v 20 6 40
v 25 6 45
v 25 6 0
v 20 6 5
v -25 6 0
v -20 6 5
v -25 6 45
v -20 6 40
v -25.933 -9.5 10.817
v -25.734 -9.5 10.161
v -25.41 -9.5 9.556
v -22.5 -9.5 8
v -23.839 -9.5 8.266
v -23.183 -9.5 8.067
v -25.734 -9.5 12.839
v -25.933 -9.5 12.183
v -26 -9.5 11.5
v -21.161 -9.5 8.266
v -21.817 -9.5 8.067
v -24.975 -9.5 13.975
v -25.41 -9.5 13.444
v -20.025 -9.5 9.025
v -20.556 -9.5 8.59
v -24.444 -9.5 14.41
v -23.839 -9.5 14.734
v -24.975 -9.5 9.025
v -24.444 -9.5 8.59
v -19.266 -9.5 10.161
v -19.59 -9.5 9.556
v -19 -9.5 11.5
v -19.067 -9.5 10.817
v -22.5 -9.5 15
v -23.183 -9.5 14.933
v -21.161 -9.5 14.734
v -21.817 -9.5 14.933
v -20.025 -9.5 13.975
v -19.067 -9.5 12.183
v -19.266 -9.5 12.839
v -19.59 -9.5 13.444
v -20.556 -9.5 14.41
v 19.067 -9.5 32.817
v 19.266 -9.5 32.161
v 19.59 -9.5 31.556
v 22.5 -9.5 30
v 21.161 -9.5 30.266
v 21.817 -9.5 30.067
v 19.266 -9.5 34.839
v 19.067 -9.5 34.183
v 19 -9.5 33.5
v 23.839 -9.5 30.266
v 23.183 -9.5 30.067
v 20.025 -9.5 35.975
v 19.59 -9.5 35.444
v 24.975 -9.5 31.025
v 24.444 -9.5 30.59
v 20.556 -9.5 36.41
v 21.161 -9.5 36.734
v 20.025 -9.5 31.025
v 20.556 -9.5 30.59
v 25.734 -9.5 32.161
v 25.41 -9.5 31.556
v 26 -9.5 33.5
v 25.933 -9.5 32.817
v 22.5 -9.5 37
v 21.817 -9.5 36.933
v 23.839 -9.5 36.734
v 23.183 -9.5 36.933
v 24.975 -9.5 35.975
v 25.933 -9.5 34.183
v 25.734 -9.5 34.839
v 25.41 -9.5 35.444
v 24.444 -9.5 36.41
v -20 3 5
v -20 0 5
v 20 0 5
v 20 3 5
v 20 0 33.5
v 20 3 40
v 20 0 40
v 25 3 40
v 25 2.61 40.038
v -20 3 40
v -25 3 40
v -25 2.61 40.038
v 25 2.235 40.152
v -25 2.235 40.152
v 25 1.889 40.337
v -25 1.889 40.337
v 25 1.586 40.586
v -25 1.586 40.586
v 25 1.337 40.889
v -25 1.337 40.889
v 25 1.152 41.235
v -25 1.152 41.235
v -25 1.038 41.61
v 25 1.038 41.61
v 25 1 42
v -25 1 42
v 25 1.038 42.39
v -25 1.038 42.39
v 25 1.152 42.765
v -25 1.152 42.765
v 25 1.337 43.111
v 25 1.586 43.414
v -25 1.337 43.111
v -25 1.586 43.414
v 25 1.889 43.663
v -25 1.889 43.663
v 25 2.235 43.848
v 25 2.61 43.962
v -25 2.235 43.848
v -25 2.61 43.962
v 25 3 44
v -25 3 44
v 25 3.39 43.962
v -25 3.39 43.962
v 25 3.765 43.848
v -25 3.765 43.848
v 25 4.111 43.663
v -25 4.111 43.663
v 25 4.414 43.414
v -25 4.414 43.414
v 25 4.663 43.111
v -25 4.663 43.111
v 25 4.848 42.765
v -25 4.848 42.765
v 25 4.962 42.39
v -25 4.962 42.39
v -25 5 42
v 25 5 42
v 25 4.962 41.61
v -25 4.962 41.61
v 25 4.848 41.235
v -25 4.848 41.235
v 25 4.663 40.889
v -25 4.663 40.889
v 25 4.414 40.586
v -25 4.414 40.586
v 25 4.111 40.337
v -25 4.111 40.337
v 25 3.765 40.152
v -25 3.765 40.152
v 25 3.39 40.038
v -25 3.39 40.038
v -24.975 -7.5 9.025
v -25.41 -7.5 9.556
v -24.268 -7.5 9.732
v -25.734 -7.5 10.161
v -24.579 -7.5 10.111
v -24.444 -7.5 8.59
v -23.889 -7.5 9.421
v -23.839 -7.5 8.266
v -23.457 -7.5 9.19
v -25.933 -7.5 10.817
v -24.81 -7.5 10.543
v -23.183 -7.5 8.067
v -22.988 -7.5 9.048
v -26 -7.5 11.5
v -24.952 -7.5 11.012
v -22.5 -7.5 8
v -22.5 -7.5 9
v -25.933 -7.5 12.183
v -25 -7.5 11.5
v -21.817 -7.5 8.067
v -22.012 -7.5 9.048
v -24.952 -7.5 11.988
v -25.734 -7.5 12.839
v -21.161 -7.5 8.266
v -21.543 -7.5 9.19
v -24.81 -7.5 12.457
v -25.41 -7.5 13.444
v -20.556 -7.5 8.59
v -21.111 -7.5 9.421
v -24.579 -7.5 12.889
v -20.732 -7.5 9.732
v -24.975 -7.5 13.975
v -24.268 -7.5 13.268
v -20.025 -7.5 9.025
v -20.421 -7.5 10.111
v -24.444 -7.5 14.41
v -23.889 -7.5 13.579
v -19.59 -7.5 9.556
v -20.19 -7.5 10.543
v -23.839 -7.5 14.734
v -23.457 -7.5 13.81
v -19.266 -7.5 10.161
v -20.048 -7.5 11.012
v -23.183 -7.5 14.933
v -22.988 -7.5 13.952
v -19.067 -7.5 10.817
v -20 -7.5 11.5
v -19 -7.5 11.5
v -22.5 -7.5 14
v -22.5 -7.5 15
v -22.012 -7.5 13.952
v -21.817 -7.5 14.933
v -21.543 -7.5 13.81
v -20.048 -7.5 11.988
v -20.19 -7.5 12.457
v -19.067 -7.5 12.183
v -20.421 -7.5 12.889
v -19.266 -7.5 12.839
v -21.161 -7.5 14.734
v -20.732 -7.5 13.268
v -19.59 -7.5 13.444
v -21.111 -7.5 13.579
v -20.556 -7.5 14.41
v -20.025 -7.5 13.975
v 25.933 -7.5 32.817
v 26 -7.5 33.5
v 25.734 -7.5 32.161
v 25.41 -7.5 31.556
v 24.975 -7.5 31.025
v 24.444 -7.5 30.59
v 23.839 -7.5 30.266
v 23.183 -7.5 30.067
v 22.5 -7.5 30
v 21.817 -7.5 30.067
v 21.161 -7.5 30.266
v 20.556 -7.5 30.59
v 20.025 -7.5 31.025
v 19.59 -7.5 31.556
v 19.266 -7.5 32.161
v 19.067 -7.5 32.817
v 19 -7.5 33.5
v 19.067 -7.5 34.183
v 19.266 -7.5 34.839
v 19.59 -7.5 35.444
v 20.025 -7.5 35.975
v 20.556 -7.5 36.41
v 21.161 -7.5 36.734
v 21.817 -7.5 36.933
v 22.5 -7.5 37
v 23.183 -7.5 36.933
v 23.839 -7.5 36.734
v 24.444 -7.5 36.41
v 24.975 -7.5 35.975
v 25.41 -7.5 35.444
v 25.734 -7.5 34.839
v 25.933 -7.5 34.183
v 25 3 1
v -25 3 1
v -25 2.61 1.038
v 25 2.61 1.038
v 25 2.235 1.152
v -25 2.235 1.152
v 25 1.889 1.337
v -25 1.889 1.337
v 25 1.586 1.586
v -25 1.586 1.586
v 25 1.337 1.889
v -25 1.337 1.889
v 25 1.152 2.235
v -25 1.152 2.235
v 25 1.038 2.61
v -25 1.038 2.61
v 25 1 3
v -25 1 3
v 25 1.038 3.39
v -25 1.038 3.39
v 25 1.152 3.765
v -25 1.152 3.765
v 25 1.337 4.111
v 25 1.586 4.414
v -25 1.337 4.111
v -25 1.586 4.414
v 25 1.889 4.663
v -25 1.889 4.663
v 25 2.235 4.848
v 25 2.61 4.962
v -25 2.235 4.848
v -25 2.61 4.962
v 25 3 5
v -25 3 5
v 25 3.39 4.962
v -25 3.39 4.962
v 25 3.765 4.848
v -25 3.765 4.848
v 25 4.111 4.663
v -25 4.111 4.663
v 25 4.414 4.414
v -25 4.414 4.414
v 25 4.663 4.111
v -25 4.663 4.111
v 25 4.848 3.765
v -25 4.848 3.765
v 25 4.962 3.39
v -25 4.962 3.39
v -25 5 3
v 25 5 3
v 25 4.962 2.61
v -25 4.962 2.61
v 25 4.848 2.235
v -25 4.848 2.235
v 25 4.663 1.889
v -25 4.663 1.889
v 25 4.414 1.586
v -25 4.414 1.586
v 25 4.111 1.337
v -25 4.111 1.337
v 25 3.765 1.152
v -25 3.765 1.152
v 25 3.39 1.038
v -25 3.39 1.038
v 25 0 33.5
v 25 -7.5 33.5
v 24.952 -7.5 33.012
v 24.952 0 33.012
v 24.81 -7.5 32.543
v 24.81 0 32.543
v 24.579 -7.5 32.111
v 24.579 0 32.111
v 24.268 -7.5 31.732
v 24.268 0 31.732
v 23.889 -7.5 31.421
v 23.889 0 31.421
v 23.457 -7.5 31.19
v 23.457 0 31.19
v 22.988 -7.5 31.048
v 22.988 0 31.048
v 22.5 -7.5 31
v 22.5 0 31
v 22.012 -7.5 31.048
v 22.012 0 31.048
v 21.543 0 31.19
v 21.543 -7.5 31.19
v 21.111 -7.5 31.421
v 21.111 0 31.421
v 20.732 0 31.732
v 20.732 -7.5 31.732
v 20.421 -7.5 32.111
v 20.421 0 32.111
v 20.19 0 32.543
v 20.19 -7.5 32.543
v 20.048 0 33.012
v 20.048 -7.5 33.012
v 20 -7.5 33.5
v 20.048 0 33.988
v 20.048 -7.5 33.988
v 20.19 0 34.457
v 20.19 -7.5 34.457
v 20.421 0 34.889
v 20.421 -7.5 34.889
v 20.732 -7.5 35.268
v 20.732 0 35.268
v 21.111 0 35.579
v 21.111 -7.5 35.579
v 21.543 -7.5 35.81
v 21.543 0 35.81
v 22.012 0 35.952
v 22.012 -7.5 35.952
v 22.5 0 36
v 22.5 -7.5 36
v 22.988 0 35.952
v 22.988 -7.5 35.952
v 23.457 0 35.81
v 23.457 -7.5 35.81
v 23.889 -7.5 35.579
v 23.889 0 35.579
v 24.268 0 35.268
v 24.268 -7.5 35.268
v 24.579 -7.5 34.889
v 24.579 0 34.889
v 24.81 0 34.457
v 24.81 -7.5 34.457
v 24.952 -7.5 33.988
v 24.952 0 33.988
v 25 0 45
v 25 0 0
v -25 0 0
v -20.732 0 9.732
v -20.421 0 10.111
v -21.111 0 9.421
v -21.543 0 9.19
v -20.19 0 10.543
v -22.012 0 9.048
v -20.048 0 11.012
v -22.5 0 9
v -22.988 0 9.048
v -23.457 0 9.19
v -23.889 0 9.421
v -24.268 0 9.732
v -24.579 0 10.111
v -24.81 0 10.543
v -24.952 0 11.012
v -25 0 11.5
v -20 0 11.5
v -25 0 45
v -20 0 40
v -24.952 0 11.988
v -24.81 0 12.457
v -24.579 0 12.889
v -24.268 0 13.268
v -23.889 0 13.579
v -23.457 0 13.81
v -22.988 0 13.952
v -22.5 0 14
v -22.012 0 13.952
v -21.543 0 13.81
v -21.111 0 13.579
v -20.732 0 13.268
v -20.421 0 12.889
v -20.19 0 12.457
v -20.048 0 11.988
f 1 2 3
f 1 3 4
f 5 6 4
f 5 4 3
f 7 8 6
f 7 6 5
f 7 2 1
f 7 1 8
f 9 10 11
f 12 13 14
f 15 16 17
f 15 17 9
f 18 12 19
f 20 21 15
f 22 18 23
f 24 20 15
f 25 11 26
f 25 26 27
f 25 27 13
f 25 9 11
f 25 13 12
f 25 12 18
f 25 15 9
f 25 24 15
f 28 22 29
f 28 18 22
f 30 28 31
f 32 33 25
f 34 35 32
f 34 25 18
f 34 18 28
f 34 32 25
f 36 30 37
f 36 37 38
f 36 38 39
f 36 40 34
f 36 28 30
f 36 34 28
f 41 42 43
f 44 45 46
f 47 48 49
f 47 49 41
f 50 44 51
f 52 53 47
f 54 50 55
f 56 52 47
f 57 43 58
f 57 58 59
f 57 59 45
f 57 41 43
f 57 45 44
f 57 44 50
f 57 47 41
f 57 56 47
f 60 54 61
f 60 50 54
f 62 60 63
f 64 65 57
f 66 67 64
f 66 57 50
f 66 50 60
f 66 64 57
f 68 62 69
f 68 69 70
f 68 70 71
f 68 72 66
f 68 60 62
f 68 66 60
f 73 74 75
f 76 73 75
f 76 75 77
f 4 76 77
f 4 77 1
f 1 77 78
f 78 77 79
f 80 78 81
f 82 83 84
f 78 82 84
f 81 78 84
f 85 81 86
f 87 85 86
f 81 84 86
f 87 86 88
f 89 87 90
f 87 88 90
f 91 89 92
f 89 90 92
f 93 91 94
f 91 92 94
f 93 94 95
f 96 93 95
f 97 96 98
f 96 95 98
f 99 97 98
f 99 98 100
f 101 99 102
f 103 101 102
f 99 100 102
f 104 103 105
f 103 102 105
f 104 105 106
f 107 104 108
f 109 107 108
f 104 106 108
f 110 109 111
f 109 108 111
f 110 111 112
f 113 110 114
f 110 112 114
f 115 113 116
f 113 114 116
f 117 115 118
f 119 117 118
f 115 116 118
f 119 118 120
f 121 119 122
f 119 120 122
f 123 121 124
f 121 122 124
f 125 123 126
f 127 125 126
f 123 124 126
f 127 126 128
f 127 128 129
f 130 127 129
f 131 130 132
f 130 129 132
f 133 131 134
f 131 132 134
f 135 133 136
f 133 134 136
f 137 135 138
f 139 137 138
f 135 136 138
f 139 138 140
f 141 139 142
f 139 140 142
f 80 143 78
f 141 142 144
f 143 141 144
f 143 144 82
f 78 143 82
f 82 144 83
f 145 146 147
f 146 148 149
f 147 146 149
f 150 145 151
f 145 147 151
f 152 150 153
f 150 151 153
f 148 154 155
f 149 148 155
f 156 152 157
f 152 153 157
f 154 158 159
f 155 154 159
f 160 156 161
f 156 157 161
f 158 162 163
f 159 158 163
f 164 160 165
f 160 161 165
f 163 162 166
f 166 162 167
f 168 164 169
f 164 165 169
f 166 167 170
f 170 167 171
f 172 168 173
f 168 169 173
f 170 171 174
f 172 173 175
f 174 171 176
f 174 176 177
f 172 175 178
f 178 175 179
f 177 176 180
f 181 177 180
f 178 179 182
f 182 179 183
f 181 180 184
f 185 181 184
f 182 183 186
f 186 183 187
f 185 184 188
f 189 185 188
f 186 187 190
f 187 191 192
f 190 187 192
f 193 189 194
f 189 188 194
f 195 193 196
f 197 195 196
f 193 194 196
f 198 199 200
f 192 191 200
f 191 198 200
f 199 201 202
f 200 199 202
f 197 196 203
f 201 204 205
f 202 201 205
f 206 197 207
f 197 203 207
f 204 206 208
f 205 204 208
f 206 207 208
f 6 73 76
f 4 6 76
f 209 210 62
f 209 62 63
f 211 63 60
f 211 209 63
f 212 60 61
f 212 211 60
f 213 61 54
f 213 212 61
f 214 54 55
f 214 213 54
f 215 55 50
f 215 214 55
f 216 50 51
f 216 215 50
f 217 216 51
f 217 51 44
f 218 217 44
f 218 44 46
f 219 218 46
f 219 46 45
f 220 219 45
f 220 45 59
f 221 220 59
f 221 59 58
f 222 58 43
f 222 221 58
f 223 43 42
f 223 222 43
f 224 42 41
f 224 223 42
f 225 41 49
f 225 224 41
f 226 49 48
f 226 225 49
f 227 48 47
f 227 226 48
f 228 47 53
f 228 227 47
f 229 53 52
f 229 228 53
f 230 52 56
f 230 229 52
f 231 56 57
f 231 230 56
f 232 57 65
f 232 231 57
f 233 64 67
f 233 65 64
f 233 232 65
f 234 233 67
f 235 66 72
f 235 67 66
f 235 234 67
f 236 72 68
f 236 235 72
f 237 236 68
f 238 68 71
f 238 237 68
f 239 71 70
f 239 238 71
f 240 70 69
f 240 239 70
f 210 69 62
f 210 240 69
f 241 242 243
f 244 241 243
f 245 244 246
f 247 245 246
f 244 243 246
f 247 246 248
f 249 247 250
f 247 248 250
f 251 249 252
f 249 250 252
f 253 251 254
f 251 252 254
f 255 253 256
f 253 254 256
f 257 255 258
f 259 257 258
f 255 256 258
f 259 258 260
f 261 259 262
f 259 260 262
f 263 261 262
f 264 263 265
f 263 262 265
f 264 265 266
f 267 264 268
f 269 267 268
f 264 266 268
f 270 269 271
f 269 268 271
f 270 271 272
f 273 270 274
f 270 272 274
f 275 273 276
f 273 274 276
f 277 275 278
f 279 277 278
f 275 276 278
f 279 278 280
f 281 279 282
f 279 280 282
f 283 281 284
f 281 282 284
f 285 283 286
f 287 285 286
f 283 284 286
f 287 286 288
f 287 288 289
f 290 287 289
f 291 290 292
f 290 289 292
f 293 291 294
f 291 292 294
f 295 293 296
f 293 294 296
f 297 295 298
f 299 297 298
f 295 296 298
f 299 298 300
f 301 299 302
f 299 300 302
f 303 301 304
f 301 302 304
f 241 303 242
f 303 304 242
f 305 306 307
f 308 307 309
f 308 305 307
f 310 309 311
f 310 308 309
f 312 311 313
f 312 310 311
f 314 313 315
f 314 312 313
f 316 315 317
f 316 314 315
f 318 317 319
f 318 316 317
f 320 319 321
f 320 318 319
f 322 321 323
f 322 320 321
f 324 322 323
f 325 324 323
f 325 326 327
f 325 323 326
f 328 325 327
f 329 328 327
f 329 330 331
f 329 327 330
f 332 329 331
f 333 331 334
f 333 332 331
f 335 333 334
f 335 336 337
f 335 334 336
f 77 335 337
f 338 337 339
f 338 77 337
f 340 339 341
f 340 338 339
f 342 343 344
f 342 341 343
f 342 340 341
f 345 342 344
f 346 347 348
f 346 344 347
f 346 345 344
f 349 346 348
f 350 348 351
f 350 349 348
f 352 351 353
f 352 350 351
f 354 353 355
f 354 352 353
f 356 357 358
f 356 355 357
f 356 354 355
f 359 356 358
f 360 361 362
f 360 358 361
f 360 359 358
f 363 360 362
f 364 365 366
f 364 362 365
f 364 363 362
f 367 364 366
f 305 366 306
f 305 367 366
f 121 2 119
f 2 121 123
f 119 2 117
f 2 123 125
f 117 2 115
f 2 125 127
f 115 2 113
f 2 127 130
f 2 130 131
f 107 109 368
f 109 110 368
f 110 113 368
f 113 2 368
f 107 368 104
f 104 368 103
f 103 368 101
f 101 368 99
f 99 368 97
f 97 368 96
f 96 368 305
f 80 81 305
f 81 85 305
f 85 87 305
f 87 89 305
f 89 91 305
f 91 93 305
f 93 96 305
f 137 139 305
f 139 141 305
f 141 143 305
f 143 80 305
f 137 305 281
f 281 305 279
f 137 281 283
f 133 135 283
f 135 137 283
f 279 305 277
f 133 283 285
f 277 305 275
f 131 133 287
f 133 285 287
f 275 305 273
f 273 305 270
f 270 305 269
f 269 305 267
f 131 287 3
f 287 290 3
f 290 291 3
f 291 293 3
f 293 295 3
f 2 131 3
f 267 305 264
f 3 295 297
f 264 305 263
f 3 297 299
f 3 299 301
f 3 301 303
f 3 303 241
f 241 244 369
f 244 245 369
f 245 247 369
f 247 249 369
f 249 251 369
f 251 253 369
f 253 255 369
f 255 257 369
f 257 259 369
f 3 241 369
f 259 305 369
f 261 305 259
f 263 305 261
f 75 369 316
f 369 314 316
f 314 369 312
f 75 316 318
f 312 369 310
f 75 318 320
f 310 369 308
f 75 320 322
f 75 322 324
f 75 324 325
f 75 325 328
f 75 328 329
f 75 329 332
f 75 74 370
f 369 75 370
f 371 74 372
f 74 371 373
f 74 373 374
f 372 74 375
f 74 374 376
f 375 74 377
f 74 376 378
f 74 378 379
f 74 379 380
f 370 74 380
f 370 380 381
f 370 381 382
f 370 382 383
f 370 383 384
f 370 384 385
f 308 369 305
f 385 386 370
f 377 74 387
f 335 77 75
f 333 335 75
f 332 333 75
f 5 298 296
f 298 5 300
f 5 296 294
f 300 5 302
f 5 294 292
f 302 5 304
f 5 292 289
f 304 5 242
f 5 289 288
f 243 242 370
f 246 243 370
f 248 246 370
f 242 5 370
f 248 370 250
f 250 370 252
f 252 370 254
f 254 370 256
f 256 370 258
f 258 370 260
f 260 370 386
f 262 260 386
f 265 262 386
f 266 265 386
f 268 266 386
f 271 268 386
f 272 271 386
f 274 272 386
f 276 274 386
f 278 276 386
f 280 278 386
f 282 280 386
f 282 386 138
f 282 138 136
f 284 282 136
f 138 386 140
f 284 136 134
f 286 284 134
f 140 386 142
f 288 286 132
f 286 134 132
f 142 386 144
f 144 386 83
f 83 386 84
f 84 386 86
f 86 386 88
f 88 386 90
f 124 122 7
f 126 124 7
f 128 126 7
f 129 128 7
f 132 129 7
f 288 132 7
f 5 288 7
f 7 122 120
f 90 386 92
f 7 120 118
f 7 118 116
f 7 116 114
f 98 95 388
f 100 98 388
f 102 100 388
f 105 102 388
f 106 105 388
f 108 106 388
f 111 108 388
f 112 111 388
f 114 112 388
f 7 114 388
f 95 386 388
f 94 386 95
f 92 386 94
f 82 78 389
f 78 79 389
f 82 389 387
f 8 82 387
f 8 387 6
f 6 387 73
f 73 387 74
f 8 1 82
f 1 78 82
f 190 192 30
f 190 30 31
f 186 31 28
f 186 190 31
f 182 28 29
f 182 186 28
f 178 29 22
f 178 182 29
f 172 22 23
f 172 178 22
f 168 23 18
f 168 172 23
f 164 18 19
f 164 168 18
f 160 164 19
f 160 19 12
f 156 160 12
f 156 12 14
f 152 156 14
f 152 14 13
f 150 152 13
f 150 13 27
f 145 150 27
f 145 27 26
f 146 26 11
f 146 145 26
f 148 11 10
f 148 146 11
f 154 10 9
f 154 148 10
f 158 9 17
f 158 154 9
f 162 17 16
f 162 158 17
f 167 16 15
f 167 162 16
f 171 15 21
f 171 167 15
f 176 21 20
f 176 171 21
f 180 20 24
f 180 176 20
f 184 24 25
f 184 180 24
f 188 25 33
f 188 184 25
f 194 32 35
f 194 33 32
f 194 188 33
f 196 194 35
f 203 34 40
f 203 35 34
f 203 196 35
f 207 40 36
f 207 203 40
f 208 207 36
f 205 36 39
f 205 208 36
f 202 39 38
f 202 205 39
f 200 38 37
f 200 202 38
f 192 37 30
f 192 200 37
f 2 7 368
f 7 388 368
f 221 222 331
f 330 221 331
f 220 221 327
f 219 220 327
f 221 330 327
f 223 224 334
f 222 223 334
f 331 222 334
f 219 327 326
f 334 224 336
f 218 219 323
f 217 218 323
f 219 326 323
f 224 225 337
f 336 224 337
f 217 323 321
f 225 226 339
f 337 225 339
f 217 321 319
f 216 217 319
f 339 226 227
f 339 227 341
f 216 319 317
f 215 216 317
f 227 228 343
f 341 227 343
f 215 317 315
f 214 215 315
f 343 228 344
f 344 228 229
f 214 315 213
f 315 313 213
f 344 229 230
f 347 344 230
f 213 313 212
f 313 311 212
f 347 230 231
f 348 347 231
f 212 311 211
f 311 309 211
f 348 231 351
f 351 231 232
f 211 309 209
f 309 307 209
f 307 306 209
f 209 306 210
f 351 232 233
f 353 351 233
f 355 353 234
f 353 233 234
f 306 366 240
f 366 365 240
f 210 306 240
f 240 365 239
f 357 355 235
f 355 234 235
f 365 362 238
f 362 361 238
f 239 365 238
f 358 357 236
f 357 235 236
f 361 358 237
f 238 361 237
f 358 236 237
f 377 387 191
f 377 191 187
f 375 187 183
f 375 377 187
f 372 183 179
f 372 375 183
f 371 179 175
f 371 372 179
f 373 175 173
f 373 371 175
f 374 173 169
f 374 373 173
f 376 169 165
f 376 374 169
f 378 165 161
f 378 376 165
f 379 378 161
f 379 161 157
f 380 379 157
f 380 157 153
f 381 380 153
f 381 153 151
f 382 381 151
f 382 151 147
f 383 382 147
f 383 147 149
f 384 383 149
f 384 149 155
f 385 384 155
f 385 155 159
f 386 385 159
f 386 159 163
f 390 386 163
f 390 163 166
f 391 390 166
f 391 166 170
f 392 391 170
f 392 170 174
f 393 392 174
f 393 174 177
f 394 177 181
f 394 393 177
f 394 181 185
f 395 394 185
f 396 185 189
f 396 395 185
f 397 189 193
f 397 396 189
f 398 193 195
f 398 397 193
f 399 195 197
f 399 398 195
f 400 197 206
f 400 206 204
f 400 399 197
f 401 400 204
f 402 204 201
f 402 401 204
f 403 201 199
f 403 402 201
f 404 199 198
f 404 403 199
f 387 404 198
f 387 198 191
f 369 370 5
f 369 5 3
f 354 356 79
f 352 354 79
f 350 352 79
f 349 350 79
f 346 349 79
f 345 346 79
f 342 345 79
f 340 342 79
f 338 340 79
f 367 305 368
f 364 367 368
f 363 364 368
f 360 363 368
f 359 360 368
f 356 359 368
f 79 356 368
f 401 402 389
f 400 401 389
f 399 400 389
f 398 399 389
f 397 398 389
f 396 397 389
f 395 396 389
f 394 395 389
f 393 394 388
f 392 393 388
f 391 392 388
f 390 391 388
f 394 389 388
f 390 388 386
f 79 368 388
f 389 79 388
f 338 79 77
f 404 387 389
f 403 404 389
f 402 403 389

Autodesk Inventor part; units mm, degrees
ref_plane "YZ Plane" through (0, 0, 0) normal (1, 0, 0) x (0, 1, 0)
ref_plane "XZ Plane" through (0, 0, 0) normal (0, 1, 0) x (-1, 0, 0)
ref_plane "XY Plane" through (0, 0, 0) normal (0, 0, 1) x (1, 0, 0)
sketch "Sketch1" plane through (0, 0, 0) normal (0, 1, 0) x (-1, 0, 0)
  line L0 (25, 0) -> (25, 45)
  line L1 (25, 45) -> (-25, 45)
  line L2 (-25, 45) -> (-25, 0)
  line L3 (25, 0) -> (-25, 0)
  line L4 (20, 5) -> (-20, 5)
  line L5 (-20, 5) -> (-20, 40)
  line L6 (-20, 40) -> (20, 40)
  line L7 (20, 40) -> (20, 5)
  point P0 (0, 0)
  dimension "d2" = 45
  dimension "d3" = 50
  dimension "d4" = 45
  dimension "d5" = 50
  dimension "d9" = 35
  dimension "d10" = 40
  dimension "d11" = 35
extrude "Extrusion1" add sketch "Sketch1" along normal blind 6
sketch "Sketch2" plane through (0, 0, 0) normal (0, -1, 0) x (1, 0, 0)
  line L0 (25, 45) -> (25, 0) projected
  line L1 (-25, 45) -> (25, 45) projected
  circle A0 centre (22.5, 33.5) radius 2.5
  line L2 (-25, 0) -> (-25, 45) projected
  line L3 (25, 0) -> (-25, 0) projected
  circle A1 centre (-22.5, 11.5) radius 2.5
  point P0 (0, 0)
  dimension "d16" = 5
  dimension "d19" = 5
extrude "Extrusion2" add sketch "Sketch2" along normal blind 7.5 contours A1 | A0
sketch "Sketch3" plane through (22.5, -7.5, 33.5) normal (0, -1, 0) x (1, 0, 0)
  circle A0 centre (0, 0) radius 3.5
  point P0 (-22.5, -33.5)
  dimension "d22" = 7
sketch "Sketch4" plane through (-22.5, -7.5, 11.5) normal (0, -1, 0) x (1, 0, 0)
  circle A0 centre (0, 0) radius 3.5
  point P0 (22.5, -11.5)
  dimension "d23" = 7
extrude "Extrusion3" add sketch "Sketch4" along normal blind 2
extrude "Extrusion4" add sketch "Sketch3" along normal blind 2
sketch "Sketch6" plane through (25, 0, 0) normal (1, 0, 0) x (0, 0, -1)
  line L0 (0, 0) -> (0, 6)
  line L1 (0, 0) -> (0, 6) projected
  line L2 (-45, 0) -> (-45, 6)
  circle A0 centre (-42, 3) radius 2
  circle A1 centre (-3, 3) radius 2
  dimension "d41" = 6
  dimension "d44" = 4
  dimension "d45" = 4
hole "Hole2" at (25, 3, 42) at (25, 3, 3) direction (-1, 0, 0) diameter 4 end through all both
